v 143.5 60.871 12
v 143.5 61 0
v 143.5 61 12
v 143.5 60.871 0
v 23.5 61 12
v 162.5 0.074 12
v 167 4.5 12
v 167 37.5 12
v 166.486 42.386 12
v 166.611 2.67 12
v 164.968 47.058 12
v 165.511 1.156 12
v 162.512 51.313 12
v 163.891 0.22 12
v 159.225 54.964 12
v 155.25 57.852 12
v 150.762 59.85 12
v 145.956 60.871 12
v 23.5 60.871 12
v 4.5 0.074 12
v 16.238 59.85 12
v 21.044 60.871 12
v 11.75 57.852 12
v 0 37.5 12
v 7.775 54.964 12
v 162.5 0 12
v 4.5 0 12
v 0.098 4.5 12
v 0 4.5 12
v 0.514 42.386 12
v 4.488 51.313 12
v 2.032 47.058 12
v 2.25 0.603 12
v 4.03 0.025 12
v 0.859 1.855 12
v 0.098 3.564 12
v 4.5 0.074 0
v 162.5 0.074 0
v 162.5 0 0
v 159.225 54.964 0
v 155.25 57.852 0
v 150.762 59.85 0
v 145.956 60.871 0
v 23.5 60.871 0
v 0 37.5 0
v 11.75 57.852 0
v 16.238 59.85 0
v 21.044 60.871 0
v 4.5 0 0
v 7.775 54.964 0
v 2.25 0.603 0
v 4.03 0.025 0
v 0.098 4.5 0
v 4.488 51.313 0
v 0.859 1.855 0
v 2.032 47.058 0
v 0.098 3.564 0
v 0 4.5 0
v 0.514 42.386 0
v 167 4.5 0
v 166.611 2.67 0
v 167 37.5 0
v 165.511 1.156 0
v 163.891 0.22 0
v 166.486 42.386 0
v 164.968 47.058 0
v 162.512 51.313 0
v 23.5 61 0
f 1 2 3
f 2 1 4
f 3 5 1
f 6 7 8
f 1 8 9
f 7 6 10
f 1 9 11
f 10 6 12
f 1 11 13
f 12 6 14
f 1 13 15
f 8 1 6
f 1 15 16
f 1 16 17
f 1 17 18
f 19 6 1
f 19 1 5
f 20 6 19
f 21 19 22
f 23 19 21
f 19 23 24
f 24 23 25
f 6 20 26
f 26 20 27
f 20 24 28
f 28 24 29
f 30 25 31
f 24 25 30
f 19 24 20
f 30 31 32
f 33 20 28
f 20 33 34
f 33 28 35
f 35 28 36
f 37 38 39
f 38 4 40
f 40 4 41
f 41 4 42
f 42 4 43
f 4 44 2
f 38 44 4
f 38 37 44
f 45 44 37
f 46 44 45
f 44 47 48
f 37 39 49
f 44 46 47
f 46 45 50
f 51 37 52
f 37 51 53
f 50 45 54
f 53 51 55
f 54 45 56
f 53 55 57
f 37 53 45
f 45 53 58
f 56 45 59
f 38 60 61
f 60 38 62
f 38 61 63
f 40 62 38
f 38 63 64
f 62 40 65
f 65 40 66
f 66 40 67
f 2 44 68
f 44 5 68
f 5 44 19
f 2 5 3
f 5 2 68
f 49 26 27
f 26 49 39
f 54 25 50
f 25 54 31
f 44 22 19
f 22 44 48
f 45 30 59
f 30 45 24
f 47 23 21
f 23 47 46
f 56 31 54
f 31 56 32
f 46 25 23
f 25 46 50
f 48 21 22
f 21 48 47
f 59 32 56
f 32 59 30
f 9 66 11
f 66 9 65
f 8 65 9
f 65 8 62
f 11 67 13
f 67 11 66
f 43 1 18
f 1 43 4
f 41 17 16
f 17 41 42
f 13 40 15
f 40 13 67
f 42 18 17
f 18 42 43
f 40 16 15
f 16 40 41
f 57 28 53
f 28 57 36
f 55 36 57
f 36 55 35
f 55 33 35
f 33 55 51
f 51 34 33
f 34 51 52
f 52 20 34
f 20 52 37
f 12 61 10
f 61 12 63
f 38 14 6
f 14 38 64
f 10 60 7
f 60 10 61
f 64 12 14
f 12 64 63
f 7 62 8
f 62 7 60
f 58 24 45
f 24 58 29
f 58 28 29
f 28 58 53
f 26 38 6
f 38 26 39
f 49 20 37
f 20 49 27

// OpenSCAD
W = 167;
H = 61;
T = 12;
RT = 23.5;
RB = 4.5;

// main casing
color("#b13e53") {
    union() {
        // middle vert
        translate([RT, 0, 0])
            cube([W-RT*2, H, T]);
        // tlc
        translate([RT, H-RT, 0])
            cylinder(h=12, r=RT);
        // trc
        translate([W-RT, H-RT, 0])
            cylinder(h=12, r=RT);
        // blc
        translate([RB, RB, 0])
            cylinder(h=12, r=RB);
        // brc
        translate([W-RB, RB, 0])
            cylinder(h=12, r=RB);
        // middle hor
        translate([0, RB, 0])
            cube([W, H-RT-RB, T]);
        // bottom
        translate([RB, 0, 0])
            cube([W-RB*2, RB, T]);
    }
}
